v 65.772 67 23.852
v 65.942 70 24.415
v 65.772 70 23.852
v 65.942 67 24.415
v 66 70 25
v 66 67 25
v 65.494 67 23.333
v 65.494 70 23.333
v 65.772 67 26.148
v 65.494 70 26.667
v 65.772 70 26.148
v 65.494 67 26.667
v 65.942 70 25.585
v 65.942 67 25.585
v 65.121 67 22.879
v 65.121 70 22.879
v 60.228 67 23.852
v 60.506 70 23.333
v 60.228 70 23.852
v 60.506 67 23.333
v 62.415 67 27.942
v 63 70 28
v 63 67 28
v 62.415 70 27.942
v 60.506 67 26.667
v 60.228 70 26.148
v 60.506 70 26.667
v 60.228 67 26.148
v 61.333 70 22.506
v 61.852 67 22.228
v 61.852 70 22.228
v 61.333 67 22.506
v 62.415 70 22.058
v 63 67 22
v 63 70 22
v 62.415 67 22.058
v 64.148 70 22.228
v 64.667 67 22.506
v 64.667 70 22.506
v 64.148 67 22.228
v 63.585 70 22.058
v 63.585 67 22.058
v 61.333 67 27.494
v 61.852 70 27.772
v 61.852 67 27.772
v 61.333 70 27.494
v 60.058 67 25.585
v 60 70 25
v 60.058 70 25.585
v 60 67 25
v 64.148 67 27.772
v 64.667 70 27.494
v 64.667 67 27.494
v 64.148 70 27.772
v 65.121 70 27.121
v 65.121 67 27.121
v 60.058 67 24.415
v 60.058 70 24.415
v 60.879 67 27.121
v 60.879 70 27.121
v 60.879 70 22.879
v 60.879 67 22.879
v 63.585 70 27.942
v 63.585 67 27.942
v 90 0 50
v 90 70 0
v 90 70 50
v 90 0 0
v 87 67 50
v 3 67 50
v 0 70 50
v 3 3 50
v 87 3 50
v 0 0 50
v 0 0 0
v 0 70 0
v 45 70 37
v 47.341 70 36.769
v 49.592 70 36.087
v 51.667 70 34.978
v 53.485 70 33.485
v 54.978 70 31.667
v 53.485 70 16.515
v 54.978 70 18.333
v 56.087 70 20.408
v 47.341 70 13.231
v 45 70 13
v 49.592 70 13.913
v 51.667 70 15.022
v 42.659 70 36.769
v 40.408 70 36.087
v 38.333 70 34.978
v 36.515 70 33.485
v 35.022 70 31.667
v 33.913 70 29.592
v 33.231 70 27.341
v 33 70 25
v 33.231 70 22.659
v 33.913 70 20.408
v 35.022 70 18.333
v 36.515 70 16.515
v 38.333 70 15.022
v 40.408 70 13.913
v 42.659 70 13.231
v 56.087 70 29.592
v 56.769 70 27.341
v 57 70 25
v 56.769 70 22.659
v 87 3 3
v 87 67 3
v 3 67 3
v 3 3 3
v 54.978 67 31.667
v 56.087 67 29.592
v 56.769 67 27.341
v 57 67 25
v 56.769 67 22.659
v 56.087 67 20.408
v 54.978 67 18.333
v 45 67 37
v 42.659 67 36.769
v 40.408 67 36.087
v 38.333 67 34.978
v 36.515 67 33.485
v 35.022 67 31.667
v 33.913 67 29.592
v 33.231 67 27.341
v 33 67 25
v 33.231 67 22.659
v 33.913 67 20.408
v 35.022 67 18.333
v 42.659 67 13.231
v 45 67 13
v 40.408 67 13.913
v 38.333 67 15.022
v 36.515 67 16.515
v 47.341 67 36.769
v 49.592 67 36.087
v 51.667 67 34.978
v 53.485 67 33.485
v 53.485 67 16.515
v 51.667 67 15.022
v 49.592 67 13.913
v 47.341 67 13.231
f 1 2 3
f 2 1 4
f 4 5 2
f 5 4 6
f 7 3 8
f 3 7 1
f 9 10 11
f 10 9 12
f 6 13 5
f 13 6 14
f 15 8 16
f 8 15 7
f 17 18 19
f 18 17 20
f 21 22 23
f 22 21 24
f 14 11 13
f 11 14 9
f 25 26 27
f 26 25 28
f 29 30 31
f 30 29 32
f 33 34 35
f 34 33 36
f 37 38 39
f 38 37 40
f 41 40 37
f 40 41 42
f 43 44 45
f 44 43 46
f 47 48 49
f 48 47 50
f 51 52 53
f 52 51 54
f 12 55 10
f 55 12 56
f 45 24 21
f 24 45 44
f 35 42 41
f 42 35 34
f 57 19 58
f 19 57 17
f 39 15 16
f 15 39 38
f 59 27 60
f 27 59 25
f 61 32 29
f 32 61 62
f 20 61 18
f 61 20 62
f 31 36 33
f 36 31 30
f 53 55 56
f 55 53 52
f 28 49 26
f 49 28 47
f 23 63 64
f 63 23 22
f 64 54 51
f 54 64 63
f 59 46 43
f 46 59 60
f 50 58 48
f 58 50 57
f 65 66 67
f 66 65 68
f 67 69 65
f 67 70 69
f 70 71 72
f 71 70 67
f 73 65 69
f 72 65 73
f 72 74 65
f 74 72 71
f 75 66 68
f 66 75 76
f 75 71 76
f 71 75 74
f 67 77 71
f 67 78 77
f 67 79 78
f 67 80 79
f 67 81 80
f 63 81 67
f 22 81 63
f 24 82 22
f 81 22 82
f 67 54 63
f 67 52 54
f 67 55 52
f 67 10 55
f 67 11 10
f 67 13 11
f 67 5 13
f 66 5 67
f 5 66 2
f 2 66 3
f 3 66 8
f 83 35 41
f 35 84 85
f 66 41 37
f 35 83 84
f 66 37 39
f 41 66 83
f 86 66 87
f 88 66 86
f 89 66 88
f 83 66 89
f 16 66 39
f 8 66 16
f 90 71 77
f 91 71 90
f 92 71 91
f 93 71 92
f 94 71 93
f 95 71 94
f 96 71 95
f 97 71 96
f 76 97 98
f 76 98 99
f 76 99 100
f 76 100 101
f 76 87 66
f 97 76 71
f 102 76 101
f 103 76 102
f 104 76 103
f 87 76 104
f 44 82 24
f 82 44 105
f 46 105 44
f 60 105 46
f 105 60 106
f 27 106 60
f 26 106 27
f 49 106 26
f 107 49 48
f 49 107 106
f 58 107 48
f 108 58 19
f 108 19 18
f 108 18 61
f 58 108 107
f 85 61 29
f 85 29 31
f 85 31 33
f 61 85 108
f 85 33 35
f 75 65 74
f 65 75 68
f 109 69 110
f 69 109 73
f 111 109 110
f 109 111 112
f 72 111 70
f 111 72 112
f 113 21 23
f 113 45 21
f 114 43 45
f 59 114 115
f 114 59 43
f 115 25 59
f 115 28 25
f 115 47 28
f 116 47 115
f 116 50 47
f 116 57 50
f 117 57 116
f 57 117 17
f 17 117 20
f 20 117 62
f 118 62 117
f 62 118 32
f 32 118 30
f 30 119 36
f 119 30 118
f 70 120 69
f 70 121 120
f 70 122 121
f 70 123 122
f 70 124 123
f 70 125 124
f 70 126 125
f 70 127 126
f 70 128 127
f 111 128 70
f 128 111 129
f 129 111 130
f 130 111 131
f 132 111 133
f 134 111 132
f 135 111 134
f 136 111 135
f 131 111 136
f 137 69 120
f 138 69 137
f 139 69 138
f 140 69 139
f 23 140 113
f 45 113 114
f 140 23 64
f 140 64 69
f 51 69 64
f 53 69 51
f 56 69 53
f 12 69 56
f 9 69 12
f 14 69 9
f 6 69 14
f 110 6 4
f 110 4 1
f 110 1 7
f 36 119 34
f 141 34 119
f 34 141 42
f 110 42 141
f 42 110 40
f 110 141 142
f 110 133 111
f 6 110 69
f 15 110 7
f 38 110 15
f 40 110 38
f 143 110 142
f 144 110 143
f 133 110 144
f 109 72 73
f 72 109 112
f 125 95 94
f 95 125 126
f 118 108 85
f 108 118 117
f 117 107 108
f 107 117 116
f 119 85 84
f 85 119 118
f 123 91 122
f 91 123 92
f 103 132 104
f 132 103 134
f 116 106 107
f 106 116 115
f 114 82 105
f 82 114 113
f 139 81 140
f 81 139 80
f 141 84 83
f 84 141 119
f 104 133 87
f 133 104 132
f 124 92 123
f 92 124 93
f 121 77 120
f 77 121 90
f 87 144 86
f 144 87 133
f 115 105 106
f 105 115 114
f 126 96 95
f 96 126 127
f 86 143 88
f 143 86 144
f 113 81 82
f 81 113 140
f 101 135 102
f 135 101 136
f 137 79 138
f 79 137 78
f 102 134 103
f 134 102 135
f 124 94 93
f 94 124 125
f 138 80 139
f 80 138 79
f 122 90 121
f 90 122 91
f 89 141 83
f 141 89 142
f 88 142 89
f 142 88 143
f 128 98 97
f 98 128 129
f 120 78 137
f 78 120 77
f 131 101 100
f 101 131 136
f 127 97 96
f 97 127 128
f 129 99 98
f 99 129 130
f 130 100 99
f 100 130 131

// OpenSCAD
$fn = 32;

// ----------------------------------------------------------------------
// Vent box: roundvent enclosure
// ----------------------------------------------------------------------

// --- parameters (mm) ---
box_l = 90;               // box length, X
box_w = 70;               // box width, Y
box_h = 50;               // box height, Z
wall_t = 3;               // shell wall thickness
vent_d = 24;              // central vent diameter
ring_d = 6;               // ring hole diameter
n_ring = 6;               // holes in the ring
ring_r = 18;              // ring radius
fit_tol = 0.05;           // tolerance for press fits, mm
free_tol = 0.3;           // tolerance for clearance fits, mm

ring_step = 360 / n_ring;  // ring hole angular step

difference() {
  cube([box_l, box_w, box_h]);
  translate([wall_t, wall_t, wall_t])
    cube([box_l - 2 * wall_t, box_w - 2 * wall_t, box_h]);
  translate([box_l / 2, box_w - wall_t - 1, box_h / 2])
    rotate([-90, 0, 0]) cylinder(h = wall_t + 2, d = vent_d);
  for (i = [0 : n_ring - 1])
    translate([box_l / 2, box_w - wall_t - 1, box_h / 2])
      rotate([0, 0, i * ring_step])
        translate([ring_r, 0, 0]) rotate([-90, 0, 0])
          cylinder(h = wall_t + 2, d = ring_d);
}
